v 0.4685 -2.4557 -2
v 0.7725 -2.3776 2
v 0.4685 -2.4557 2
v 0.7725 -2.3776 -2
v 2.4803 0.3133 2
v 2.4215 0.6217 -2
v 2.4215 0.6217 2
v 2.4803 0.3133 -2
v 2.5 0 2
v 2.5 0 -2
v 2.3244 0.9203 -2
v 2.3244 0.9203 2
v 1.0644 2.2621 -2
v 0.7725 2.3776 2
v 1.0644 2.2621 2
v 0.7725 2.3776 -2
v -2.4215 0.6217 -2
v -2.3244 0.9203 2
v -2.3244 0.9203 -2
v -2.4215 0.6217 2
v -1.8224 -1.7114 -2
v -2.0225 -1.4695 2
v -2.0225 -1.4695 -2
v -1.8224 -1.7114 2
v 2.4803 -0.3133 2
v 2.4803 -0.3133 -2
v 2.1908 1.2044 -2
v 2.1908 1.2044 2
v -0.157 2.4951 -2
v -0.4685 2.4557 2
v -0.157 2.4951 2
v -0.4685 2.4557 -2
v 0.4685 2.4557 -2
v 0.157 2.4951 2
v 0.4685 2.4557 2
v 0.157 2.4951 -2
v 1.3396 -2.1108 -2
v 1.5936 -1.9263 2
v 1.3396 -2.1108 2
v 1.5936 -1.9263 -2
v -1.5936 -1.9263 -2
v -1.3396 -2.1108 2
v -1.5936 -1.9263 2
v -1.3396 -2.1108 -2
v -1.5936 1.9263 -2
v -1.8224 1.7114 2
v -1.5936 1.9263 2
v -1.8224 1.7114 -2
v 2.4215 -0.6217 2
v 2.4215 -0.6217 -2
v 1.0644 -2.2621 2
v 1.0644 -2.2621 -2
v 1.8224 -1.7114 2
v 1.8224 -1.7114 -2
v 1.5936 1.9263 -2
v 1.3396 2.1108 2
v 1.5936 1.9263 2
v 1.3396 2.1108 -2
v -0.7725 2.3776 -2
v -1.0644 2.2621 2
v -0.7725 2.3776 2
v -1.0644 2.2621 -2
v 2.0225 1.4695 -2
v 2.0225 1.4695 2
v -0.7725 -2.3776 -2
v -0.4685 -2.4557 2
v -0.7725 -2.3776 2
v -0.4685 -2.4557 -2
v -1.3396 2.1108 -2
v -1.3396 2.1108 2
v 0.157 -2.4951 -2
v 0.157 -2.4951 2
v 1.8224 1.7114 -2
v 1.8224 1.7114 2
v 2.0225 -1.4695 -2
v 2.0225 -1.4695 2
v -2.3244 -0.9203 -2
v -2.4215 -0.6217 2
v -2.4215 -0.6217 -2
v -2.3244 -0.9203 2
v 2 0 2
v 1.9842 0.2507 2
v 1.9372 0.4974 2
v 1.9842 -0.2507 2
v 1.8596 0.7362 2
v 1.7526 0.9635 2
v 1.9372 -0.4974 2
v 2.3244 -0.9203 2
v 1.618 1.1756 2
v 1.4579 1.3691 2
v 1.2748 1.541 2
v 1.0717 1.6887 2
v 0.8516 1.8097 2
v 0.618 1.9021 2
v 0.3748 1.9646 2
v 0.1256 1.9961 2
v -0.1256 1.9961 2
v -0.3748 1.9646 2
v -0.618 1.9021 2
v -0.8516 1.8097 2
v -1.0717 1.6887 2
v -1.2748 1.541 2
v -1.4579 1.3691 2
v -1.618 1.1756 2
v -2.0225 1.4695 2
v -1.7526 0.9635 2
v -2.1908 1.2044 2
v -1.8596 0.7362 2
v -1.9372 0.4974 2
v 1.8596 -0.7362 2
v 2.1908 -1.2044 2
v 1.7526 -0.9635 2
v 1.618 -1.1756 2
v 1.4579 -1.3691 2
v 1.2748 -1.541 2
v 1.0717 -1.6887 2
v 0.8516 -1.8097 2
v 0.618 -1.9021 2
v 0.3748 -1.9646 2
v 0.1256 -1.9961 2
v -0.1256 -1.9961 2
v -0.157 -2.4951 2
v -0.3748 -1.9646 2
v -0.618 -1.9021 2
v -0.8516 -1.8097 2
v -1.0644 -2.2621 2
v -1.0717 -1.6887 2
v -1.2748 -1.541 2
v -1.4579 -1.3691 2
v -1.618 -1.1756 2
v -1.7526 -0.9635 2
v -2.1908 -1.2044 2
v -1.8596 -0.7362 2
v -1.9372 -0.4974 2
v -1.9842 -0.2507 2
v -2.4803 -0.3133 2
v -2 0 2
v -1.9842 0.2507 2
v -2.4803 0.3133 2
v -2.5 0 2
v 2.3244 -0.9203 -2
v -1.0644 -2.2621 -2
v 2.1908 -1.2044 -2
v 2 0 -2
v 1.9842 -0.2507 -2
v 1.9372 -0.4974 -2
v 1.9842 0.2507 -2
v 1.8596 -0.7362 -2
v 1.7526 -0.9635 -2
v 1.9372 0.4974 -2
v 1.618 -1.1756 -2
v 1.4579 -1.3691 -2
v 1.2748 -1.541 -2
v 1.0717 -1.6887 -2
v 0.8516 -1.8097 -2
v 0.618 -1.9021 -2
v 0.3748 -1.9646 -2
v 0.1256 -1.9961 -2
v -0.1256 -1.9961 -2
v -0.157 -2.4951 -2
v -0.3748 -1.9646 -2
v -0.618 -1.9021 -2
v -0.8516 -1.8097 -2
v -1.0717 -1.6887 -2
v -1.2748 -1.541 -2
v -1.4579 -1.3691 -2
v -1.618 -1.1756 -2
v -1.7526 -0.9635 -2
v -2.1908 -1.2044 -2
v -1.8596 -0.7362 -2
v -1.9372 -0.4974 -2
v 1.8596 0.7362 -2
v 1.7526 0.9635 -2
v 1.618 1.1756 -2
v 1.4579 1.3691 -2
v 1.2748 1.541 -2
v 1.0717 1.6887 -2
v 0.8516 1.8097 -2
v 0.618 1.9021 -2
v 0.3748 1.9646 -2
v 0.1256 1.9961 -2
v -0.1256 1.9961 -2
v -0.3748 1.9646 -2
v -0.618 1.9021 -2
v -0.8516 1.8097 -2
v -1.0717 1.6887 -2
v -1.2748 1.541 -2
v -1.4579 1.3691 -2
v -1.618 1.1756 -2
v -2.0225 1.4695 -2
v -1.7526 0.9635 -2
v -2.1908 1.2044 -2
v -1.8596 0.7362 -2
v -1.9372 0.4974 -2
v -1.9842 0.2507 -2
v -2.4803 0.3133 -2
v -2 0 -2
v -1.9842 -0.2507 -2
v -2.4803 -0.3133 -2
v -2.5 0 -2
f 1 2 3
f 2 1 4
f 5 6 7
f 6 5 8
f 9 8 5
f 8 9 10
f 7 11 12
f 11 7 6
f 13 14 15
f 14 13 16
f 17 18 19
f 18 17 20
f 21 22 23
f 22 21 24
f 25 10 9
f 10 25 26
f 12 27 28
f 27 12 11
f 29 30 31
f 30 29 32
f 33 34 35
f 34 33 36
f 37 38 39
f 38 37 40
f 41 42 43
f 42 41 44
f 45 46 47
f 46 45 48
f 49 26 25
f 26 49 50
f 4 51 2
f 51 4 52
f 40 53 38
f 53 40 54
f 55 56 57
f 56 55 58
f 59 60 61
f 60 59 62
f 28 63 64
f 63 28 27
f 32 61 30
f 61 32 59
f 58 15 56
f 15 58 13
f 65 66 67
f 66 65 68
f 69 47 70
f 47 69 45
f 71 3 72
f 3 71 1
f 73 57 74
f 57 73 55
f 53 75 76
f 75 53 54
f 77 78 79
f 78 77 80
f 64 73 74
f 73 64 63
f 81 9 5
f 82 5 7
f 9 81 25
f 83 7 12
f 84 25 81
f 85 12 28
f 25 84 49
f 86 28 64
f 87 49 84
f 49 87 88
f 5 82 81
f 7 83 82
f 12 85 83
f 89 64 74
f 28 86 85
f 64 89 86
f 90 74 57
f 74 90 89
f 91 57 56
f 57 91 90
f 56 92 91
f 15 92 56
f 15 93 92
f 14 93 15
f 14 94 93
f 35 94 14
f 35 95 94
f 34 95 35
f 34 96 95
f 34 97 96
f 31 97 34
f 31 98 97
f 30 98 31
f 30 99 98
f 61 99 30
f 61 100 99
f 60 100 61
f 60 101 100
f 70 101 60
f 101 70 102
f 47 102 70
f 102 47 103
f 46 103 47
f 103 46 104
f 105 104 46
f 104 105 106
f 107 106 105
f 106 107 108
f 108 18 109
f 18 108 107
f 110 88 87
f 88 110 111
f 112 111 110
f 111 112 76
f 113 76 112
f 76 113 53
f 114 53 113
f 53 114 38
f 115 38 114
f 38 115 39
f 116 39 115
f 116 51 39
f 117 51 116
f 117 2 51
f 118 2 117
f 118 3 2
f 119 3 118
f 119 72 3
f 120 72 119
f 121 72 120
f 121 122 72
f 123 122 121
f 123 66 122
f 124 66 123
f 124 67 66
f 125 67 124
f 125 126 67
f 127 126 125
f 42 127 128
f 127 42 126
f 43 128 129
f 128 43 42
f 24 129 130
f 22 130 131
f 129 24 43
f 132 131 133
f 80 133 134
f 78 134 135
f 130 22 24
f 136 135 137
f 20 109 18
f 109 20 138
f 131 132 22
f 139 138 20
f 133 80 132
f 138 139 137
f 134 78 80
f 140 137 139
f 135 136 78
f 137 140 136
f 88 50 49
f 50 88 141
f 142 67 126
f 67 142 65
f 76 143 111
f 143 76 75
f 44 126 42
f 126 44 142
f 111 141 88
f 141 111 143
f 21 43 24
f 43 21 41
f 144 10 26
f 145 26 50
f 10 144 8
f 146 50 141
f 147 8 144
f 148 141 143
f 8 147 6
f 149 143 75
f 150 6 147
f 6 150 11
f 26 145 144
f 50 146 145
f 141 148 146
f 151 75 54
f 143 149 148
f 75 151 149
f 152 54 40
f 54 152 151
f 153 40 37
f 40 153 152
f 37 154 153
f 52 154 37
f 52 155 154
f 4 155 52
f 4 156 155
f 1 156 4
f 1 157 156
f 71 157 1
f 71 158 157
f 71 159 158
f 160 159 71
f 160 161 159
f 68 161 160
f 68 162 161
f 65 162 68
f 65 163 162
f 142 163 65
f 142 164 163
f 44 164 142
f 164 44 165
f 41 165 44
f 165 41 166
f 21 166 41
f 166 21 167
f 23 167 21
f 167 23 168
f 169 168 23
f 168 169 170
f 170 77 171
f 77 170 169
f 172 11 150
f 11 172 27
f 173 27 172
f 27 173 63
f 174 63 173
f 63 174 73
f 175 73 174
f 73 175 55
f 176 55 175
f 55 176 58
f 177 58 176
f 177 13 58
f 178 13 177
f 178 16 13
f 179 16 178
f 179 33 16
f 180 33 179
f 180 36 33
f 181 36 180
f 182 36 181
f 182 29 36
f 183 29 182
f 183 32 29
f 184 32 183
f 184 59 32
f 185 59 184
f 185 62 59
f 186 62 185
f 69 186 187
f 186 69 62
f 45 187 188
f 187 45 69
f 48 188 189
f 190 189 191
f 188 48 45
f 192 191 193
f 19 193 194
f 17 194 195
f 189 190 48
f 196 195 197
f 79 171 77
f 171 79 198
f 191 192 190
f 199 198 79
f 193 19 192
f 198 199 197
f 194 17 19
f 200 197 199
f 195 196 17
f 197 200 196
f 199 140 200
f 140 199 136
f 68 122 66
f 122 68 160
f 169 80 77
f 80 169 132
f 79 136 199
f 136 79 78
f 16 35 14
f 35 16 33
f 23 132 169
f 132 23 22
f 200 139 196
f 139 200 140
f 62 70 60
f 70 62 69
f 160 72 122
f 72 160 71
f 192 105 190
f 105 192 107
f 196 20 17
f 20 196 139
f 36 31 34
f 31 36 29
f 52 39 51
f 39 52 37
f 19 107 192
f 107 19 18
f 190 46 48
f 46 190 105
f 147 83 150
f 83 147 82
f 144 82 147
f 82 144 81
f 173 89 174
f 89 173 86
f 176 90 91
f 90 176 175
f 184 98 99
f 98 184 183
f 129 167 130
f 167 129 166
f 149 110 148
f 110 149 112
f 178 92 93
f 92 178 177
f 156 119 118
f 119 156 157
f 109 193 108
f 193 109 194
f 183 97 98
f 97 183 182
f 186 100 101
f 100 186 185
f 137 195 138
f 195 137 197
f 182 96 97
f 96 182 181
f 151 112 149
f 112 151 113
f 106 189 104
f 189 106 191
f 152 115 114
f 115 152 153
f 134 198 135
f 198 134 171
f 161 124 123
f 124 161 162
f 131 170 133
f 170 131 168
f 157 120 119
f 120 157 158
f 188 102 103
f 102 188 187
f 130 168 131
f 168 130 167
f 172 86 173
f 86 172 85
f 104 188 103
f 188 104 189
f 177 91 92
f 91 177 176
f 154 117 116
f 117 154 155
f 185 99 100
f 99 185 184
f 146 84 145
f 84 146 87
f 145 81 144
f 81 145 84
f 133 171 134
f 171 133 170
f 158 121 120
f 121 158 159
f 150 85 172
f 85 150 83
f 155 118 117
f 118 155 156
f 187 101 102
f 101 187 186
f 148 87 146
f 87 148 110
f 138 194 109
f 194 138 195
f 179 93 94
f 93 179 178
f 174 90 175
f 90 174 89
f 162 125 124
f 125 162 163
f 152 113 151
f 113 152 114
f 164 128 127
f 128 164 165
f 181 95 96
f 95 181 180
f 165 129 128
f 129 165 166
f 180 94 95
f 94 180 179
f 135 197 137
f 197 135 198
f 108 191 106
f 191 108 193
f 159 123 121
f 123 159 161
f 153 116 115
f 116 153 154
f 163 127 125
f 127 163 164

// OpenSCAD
$fn = 50;


difference() {
	union() {
		translate(v = [0, 0, -2.0000000000]) {
			cylinder(h = 4, r = 2.5000000000);
		}
	}
	union() {
		translate(v = [0, 0, -100.0000000000]) {
			cylinder(h = 200, r = 2.0000000000);
		}
	}
}
